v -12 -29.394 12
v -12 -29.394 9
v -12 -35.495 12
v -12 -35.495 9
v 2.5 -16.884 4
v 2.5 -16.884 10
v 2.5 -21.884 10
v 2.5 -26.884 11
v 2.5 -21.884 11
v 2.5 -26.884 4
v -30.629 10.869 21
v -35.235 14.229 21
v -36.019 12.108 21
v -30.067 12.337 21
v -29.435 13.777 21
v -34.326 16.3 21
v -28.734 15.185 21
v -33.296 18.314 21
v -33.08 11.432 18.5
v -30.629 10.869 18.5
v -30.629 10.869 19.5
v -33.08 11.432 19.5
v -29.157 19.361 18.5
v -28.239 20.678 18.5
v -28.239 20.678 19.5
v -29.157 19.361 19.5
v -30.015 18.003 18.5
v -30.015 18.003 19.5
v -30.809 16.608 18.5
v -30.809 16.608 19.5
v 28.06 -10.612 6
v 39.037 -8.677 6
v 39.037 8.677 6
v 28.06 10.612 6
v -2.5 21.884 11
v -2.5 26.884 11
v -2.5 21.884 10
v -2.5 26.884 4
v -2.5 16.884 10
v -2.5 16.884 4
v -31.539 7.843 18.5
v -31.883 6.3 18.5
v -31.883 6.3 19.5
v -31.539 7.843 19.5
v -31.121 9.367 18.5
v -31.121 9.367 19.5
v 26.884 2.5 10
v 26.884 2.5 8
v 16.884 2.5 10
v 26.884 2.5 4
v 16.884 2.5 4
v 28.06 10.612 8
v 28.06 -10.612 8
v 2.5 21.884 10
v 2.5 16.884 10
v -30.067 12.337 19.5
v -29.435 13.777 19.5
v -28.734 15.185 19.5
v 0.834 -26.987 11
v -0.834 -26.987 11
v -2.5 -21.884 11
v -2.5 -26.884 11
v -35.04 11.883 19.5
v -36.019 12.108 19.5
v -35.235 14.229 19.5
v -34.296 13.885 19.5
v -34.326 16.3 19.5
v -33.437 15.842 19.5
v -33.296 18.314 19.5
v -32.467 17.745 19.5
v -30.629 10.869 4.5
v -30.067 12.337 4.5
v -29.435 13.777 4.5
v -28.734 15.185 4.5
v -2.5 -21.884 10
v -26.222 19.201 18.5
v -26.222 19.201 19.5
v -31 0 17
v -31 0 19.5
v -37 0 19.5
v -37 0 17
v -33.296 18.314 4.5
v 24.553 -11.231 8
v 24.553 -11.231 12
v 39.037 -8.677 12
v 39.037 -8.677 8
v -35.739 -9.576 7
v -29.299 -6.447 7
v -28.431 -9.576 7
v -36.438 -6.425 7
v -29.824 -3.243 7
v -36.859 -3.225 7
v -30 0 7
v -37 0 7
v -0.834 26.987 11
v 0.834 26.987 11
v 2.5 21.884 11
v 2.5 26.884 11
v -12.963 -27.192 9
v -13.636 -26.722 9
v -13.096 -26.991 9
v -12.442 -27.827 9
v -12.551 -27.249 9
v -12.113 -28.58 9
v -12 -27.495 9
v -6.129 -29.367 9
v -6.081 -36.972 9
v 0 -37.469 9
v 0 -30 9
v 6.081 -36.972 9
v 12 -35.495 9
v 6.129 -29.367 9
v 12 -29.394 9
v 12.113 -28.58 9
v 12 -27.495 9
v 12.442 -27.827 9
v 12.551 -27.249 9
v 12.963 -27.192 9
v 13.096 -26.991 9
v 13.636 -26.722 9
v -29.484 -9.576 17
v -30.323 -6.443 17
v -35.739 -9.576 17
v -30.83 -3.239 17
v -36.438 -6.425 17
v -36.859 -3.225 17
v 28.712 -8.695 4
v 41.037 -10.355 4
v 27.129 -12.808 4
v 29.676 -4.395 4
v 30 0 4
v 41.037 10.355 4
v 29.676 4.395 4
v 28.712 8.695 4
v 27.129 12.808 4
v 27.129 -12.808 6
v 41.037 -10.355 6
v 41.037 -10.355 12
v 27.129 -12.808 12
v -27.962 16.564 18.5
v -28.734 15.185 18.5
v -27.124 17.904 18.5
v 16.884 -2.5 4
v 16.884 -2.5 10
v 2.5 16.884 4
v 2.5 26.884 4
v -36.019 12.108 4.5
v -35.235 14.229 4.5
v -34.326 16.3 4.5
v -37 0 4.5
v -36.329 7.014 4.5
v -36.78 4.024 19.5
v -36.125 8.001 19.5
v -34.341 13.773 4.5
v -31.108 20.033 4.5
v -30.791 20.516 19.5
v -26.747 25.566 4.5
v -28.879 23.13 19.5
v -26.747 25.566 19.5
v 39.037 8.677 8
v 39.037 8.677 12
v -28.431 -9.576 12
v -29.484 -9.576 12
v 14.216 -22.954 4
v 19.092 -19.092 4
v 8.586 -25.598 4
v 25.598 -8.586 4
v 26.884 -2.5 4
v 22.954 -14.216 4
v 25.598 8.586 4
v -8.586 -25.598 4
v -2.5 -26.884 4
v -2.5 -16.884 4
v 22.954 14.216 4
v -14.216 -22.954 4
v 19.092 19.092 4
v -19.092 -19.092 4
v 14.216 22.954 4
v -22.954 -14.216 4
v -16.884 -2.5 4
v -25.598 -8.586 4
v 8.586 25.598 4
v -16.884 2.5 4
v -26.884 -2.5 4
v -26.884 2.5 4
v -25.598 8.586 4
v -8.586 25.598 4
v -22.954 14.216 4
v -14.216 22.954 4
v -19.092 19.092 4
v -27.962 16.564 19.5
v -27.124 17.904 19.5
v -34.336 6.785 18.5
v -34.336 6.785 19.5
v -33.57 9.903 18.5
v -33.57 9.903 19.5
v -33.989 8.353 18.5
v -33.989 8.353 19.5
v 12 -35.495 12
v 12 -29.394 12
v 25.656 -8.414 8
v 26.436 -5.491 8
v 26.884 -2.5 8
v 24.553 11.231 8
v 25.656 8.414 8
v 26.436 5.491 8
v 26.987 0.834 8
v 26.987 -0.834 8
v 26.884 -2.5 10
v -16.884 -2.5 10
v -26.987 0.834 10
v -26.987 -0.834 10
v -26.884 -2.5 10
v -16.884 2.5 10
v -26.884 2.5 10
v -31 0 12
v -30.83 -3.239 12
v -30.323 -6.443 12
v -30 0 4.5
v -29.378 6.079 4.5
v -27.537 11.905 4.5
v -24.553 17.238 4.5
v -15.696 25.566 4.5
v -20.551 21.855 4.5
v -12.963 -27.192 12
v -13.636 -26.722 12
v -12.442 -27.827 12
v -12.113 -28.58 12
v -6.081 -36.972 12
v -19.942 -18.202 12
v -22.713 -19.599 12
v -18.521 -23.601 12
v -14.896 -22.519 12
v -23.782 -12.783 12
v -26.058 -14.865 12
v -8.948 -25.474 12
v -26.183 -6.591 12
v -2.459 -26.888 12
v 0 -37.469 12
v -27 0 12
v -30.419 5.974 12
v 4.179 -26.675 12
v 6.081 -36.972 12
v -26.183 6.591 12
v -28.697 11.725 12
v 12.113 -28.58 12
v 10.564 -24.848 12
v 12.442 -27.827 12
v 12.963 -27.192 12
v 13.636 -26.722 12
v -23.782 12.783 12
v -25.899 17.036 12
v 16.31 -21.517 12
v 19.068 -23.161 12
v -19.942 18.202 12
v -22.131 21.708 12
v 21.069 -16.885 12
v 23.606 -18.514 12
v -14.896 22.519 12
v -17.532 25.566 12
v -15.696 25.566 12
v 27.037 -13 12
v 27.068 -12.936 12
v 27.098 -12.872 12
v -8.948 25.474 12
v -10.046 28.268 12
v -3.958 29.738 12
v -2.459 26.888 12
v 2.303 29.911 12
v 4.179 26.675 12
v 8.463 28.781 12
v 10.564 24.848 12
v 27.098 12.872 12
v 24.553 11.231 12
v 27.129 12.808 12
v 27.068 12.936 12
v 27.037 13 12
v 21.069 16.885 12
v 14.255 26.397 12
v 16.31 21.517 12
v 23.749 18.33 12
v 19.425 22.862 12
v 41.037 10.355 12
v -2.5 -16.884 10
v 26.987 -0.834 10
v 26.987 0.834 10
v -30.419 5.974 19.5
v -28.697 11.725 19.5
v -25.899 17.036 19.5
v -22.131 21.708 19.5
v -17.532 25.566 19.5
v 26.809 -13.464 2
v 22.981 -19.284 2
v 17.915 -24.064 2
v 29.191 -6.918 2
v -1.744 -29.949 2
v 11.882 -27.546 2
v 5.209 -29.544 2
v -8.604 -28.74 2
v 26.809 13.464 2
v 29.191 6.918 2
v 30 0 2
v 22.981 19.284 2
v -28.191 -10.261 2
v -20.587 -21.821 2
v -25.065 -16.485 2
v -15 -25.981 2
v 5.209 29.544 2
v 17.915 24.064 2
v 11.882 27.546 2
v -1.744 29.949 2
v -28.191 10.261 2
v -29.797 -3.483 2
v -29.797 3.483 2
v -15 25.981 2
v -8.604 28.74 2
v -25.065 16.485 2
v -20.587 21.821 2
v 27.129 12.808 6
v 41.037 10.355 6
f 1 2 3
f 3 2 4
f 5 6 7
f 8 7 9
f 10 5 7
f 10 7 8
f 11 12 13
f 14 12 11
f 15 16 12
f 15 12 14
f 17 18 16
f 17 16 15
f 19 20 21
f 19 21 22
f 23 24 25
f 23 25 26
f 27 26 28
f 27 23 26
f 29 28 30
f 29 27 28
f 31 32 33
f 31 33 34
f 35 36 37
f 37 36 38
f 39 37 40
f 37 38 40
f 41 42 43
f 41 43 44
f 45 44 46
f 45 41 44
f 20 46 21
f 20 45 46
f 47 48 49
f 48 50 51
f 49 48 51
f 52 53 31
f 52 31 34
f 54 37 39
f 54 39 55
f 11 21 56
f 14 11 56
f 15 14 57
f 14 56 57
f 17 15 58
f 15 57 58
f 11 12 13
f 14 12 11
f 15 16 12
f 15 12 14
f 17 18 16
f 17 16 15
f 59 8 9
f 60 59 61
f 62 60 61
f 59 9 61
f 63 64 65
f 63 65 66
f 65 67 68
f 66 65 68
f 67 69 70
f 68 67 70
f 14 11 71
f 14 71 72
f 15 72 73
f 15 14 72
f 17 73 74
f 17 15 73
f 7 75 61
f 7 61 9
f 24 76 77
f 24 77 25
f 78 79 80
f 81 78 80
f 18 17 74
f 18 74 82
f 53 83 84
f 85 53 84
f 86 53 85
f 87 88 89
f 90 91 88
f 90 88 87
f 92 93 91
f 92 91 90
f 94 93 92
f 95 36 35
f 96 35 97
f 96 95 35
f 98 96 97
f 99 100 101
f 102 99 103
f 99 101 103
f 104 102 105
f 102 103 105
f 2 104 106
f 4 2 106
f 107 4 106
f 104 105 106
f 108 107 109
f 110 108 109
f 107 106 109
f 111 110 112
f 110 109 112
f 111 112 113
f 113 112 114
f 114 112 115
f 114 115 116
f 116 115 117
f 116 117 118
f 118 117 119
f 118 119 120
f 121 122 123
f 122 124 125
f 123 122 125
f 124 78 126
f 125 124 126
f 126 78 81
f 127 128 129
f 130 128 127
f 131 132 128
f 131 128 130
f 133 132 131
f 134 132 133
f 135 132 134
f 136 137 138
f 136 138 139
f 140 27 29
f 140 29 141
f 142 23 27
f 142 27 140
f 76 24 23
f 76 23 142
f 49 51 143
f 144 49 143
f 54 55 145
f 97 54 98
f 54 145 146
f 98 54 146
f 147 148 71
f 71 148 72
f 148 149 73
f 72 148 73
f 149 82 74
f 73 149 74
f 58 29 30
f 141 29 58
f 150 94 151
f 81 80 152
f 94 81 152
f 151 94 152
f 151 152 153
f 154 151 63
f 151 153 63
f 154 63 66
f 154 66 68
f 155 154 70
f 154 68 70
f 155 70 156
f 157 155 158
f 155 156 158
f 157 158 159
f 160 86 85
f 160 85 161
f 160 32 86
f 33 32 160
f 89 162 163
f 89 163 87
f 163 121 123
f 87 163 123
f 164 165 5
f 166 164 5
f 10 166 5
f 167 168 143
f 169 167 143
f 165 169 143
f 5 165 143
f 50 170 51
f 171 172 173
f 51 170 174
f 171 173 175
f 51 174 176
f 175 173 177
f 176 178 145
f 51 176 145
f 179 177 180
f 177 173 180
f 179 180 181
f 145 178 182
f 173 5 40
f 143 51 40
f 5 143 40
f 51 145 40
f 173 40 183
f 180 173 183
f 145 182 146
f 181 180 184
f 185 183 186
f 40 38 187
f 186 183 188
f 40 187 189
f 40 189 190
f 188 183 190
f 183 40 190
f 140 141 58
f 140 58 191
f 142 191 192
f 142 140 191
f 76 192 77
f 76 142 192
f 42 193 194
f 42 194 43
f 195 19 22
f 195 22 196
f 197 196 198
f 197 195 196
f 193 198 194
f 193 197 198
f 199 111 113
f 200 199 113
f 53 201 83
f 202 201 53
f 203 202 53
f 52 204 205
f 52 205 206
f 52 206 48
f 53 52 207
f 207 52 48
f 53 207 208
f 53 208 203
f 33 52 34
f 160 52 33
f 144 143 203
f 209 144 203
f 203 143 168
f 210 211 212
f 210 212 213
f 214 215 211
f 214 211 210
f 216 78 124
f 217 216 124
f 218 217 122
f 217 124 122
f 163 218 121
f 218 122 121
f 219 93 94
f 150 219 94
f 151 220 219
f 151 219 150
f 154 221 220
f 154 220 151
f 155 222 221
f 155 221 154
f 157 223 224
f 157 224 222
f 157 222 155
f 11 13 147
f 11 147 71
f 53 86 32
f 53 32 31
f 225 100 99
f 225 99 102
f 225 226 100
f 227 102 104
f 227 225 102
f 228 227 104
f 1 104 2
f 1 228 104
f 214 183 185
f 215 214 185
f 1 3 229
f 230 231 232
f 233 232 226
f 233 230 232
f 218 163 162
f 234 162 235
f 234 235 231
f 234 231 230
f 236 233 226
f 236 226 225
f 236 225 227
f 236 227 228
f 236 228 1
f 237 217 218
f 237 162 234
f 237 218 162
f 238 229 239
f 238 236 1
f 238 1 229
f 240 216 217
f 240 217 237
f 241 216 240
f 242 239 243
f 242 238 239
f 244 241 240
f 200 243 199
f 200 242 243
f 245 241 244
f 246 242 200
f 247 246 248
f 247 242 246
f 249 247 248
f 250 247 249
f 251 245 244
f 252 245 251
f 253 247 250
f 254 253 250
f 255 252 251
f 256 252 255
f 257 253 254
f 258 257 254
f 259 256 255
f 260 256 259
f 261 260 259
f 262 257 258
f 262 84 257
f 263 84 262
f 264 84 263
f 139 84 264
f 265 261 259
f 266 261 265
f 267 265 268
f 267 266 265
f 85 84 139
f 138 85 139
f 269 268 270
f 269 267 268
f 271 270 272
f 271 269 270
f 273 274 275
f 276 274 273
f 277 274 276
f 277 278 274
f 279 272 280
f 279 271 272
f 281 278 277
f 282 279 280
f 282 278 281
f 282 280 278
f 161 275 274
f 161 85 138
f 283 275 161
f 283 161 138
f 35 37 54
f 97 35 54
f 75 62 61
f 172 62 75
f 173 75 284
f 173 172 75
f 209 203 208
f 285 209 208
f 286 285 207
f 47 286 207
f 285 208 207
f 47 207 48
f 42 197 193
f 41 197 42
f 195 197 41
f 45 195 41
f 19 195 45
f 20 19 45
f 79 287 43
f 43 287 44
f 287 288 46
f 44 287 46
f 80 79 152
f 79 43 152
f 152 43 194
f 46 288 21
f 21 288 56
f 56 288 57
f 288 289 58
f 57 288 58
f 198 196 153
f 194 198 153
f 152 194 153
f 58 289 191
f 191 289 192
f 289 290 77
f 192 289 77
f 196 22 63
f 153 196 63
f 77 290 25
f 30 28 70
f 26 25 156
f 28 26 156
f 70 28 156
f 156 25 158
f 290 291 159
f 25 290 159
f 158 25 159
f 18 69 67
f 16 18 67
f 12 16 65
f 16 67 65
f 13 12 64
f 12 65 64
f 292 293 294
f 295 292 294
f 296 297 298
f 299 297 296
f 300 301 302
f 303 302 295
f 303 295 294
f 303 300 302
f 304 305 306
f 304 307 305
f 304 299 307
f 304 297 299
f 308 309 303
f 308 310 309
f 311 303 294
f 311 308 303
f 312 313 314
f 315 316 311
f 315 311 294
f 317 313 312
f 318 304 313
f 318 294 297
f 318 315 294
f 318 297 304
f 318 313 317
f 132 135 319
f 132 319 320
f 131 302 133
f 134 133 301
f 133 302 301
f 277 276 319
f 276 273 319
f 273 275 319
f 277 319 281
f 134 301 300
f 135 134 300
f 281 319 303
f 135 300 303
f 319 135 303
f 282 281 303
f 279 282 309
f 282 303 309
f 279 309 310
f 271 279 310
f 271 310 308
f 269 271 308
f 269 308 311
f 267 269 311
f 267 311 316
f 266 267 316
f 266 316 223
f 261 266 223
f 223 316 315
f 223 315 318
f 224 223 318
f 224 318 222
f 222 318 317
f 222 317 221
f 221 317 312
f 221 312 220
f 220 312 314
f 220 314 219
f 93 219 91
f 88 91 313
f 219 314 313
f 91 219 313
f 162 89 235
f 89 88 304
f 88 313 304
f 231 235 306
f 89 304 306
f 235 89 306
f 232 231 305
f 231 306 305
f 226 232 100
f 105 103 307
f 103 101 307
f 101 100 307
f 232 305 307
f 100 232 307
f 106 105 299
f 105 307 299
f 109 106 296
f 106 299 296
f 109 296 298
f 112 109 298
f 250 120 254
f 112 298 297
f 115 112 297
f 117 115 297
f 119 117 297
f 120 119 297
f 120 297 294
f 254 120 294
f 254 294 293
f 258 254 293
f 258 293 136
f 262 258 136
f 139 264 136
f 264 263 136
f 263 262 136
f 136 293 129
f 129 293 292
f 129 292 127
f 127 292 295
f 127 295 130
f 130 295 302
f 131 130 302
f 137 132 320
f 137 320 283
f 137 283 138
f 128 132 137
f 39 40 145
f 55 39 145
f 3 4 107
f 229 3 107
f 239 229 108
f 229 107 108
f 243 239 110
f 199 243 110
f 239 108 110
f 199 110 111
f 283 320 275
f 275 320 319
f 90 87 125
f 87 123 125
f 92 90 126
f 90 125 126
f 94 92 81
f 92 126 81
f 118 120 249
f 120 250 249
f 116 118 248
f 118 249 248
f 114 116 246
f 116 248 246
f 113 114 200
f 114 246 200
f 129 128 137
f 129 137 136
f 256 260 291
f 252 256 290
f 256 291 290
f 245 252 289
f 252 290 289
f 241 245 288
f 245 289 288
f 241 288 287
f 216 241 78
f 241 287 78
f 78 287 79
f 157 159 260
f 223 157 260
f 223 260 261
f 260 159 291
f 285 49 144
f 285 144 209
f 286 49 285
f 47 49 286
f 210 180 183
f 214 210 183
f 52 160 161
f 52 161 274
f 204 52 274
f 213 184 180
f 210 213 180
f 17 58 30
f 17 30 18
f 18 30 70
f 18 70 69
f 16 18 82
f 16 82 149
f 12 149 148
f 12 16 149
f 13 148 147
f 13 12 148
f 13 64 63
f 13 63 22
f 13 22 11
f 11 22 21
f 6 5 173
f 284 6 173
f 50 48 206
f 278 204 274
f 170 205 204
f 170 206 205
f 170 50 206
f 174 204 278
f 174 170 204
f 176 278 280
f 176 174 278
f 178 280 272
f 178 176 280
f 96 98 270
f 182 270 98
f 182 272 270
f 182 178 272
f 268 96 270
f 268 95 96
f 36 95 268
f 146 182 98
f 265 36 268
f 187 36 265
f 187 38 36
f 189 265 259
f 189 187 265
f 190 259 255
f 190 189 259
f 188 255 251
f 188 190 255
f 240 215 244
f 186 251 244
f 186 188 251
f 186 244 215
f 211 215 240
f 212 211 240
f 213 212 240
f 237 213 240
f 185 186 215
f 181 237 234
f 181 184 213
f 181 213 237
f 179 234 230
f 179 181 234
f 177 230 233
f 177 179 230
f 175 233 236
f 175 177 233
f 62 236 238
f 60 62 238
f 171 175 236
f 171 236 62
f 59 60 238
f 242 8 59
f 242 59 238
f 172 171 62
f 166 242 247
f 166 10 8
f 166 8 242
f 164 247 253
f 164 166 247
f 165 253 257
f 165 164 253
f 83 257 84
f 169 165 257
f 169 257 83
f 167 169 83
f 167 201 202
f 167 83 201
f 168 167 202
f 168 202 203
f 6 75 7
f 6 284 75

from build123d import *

# Parameters (mm, degrees)
SKETCH_1_R           = 30
EXTRUDE_1_DEPTH      = 2
SKETCH_5_R           = 30
SKETCH_5_R_2         = 27
EXTRUDE_2_DEPTH      = 10
EXTRUDE_START        = -3
EXTRUDE_3_DEPTH      = 3
FILLET_2_R           = 3
FILLET_3_R           = 3
EXTRUDE_START_2      = -6
EXTRUDE_4_DEPTH      = 6
EXTRUDE_6_DEPTH      = 7.5
SKETCH_14_R          = 31
CUT_EXTRUDE_3_DEPTH  = 7.5
CHAMFER_4_SIZE       = 2.644904711
CHAMFER_4_SIZE_2     = 15
CHAMFER_5_SIZE       = 2.644904711
CHAMFER_5_SIZE_2     = 15
CUT_EXTRUDE_START    = -4
CUT_EXTRUDE_6_DEPTH  = 4
EXTRUDE_10_DEPTH     = 5
CUT_EXTRUDE_START_2  = 6
CUT_EXTRUDE_7_DEPTH  = 6
EXTRUDE_11_DEPTH     = 8
EXTRUDE_12_DEPTH     = 1
EXTRUDE_13_DEPTH     = 1.5
EXTRUDE_14_DEPTH     = 16.5
CUT_EXTRUDE_START_3  = -1
CUT_EXTRUDE_8_DEPTH  = 1
EXTRUDE_START_3      = 2
EXTRUDE_15_DEPTH     = 2
CUT_EXTRUDE_9_DEPTH  = 2
SKETCH_33_R          = 30
CUT_EXTRUDE_10_DEPTH = 2
SKETCH_34_R          = 30
EXTRUDE_16_DEPTH     = 2


with BuildPart() as part:
    # 草图1 → 凸台-拉伸1 (new body)
    with BuildSketch(Plane.XY):
        Circle(SKETCH_1_R)
    extrude(amount=EXTRUDE_1_DEPTH)

    # 草图5 → 凸台-拉伸2 (add)
    with BuildSketch(Plane.XY.offset(2)):
        Circle(SKETCH_5_R)
        Circle(SKETCH_5_R_2, mode=Mode.SUBTRACT)
    extrude(amount=EXTRUDE_2_DEPTH)

    # 草图6 → 凸台-拉伸3 (add)
    with BuildSketch(Plane.XY.offset(12).offset(EXTRUDE_START)):
        with BuildLine():
            Line((-12, -27.49545417), (-12, -35.49545417))
            ThreePointArc((-12, -35.49545417), (0, -37.469017424), (12, -35.49545417))
            Line((12, -35.49545417), (12, -27.49545417))
            ThreePointArc((12, -27.49545417), (0, -30), (-12, -27.49545417))
        make_face()
    extrude(amount=EXTRUDE_3_DEPTH)

    # 圆角2
    fillet_2_edges = [part.edges().sort_by_distance(p)[0] for p in [
        (-12, -27.49545417, 10.5),
    ]]
    fillet(fillet_2_edges, radius=FILLET_2_R)

    # 圆角3
    fillet_3_edges = [part.edges().sort_by_distance(p)[0] for p in [
        (12, -27.49545417, 10.5),
    ]]
    fillet(fillet_3_edges, radius=FILLET_3_R)

    # 草图8 → 凸台-拉伸4 (add)
    with BuildSketch(Plane.XY.offset(12).offset(EXTRUDE_START_2)):
        with BuildLine():
            Line((27.037011669, -13), (41.037011669, -13))
            Line((41.037011669, -13), (41.037011669, 13))
            Line((41.037011669, 13), (27.037011669, 13))
            ThreePointArc((27.037011669, 13), (30, 0), (27.037011669, -13))
        make_face()
    extrude(amount=EXTRUDE_4_DEPTH)

    # 草图13 → 凸台-拉伸6 (add, symmetric)
    with BuildSketch(Plane.XY.offset(12)):
        with BuildLine():
            Line((-26.746575291, 25.566006927), (-15.696473801, 25.566006927))
            ThreePointArc((-15.696473801, 25.566006927), (-26.181044804, 14.647624141), (-30, 0))
            Line((-30, 0), (-37, 0))
            ThreePointArc((-37, 0), (-34.341107188, 13.772739637), (-26.746575291, 25.566006927))
        make_face()
    extrude(amount=EXTRUDE_6_DEPTH, both=True)

    # 草图14 → 切除-拉伸3 (cut)
    with BuildSketch(Plane.XY.offset(19.5)):
        Circle(SKETCH_14_R)
    extrude(amount=-CUT_EXTRUDE_3_DEPTH, mode=Mode.SUBTRACT)

    # 倒角4
    # the kernel refuses this chamfer: 15, 2.644904711 mm, written as the material it takes off along each edge
    with BuildSketch(Plane(origin=(41.037011669, 13, -32.978081946), x_dir=(0.21013876076743002, -0.9776715712462589, 0), z_dir=(0, 0, 1))) as chamfer_4_piece_1_section:
        Polygon((CHAMFER_4_SIZE * 0.977671571108, -CHAMFER_4_SIZE * 0.210138760738), (-CHAMFER_4_SIZE_2 * 0.210138760767, -CHAMFER_4_SIZE_2 * 0.977671571246), (0, 0), align=None)
    chamfer_4_piece_1 = extrude(amount=83.956163893, mode=Mode.PRIVATE)
    chamfer_4_piece_1 = chamfer_4_piece_1 - Plane(origin=(0, 0, 9), x_dir=(1, 0, 0), z_dir=(0, 0, -1)) * Cylinder(30, 227, mode=Mode.PRIVATE)
    add(chamfer_4_piece_1, mode=Mode.SUBTRACT)

    # 倒角5
    # the kernel refuses this chamfer: 15, 2.644904711 mm, written as the material it takes off along each edge
    with BuildSketch(Plane(origin=(41.037011669, -13, -32.978081946), x_dir=(0.21013876076743015, 0.9776715712462588, 0), z_dir=(0, 0, 1))) as chamfer_5_piece_1_section:
        Polygon((CHAMFER_5_SIZE * 0.977671571108, CHAMFER_5_SIZE * 0.210138760738), (-CHAMFER_5_SIZE_2 * 0.210138760767, CHAMFER_5_SIZE_2 * 0.977671571246), (0, 0), align=None)
    chamfer_5_piece_1 = extrude(amount=83.956163893, mode=Mode.PRIVATE)
    chamfer_5_piece_1 = chamfer_5_piece_1 - Plane(origin=(0, 0, 9), x_dir=(1, 0, 0), z_dir=(0, 0, -1)) * Cylinder(30, 227, mode=Mode.PRIVATE)
    add(chamfer_5_piece_1, mode=Mode.SUBTRACT)

    # 草图16 → 切除-拉伸6 (cut)
    with BuildSketch(Plane.XY.offset(12).offset(CUT_EXTRUDE_START)):
        with BuildLine():
            ThreePointArc((27, 0), (26.381265258, 5.747072595), (24.553419007, 11.230744191))
            Line((24.553419007, 11.230744191), (18.452318659, 12.306532794))
            Line((18.452318659, 12.306532794), (21.994315515, -11.681983183))
            Line((21.994315515, -11.681983183), (24.553419007, -11.230744191))
            ThreePointArc((24.553419007, -11.230744191), (26.381265258, -5.747072595), (27, 0))
        make_face()
        with BuildLine():
            Line((18.452318659, 12.306532794), (24.553419007, 11.230744191))
            ThreePointArc((24.553419007, 11.230744191), (-27, 0), (24.553419007, -11.230744191))
            Line((24.553419007, -11.230744191), (21.994315515, -11.681983183))
            Line((21.994315515, -11.681983183), (18.452318659, 12.306532794))
        make_face()
        with BuildLine():
            Line((39.037011669, 8.676896027), (27.995789134, 10.62376146))
            Line((27.995789134, 10.62376146), (24.553419007, 11.230744191))
            ThreePointArc((24.553419007, 11.230744191), (26.381265258, 5.747072595), (27, 0))
            ThreePointArc((27, 0), (26.381265258, -5.747072595), (24.553419007, -11.230744191))
            Line((24.553419007, -11.230744191), (39.037011669, -8.676896027))
            Line((39.037011669, -8.676896027), (39.037011669, 8.676896027))
        make_face()
    extrude(amount=CUT_EXTRUDE_6_DEPTH, mode=Mode.SUBTRACT)

    # 草图17 → 凸台-拉伸10 (add, symmetric)
    with BuildSketch(Plane.XY.offset(12)):
        with BuildLine():
            Line((-28.430518618, -9.576304669), (-35.739255573, -9.576304669))
            ThreePointArc((-35.739255573, -9.576304669), (-36.683459871, -4.829469112), (-37, 0))
            Line((-37, 0), (-31, 0))
            Line((-31, 0), (-30, 0))
            ThreePointArc((-30, 0), (-29.605029628, -4.852032639), (-28.430518618, -9.576304669))
        make_face()
    extrude(amount=EXTRUDE_10_DEPTH, both=True)

    # 草图18 → 切除-拉伸7 (cut)
    with BuildSketch(Plane.XY.offset(12).offset(CUT_EXTRUDE_START_2)):
        with BuildLine():
            ThreePointArc((-31, 0), (-30.618603506, -4.847795306), (-29.483798753, -9.576304669))
            Line((-29.483798753, -9.576304669), (-28.430518618, -9.576304669))
            ThreePointArc((-28.430518618, -9.576304669), (-29.605029628, -4.852032639), (-30, 0))
            Line((-30, 0), (-31, 0))
        make_face()
    extrude(amount=-CUT_EXTRUDE_7_DEPTH, mode=Mode.SUBTRACT)

    # 草图19 → 凸台-拉伸11 (add)
    with BuildSketch(Plane.XY.offset(2)):
        with BuildLine():
            Line((-2.5, 26.884010118), (-2.5, 16.884010118))
            Line((-2.5, 16.884010118), (2.5, 16.884010118))
            Line((2.5, 16.884010118), (2.5, 26.884010118))
            ThreePointArc((2.5, 26.884010118), (0, 27), (-2.5, 26.884010118))
        make_face()
        with BuildLine():
            Line((26.884010118, 2.5), (16.884010118, 2.5))
            Line((16.884010118, 2.5), (16.884010118, -2.5))
            Line((16.884010118, -2.5), (26.884010118, -2.5))
            ThreePointArc((26.884010118, -2.5), (27, 0), (26.884010118, 2.5))
        make_face()
        with BuildLine():
            Line((2.5, -26.884010118), (2.5, -16.884010118))
            Line((2.5, -16.884010118), (-2.5, -16.884010118))
            Line((-2.5, -16.884010118), (-2.5, -26.884010118))
            ThreePointArc((-2.5, -26.884010118), (0, -27), (2.5, -26.884010118))
        make_face()
        with BuildLine():
            Line((-26.884010118, -2.5), (-16.884010118, -2.5))
            Line((-16.884010118, -2.5), (-16.884010118, 2.5))
            Line((-16.884010118, 2.5), (-26.884010118, 2.5))
            ThreePointArc((-26.884010118, 2.5), (-27, 0), (-26.884010118, -2.5))
        make_face()
    extrude(amount=EXTRUDE_11_DEPTH)

    # 草图20 → 凸台-拉伸12 (add)
    with BuildSketch(Plane.XY.offset(10)):
        with BuildLine():
            ThreePointArc((2.5, -26.884010118), (0, -27), (-2.5, -26.884010118))
            Line((-2.5, -26.884010118), (-2.5, -21.884010118))
            Line((-2.5, -21.884010118), (2.5, -21.884010118))
            Line((2.5, -21.884010118), (2.5, -26.884010118))
        make_face()
        with BuildLine():
            ThreePointArc((2.5, 26.884010118), (0, 27), (-2.5, 26.884010118))
            Line((-2.5, 26.884010118), (-2.5, 21.884010118))
            Line((-2.5, 21.884010118), (2.5, 21.884010118))
            Line((2.5, 21.884010118), (2.5, 26.884010118))
        make_face()
    extrude(amount=EXTRUDE_12_DEPTH)

    # 草图21 → 凸台-拉伸13 (add)
    with BuildSketch(Plane.XY.offset(19.5)):
        with BuildLine():
            Line((-28.734434843, 15.184935109), (-33.295866493, 18.31352709))
            ThreePointArc((-33.295866493, 18.31352709), (-34.796265088, 15.271540063), (-36.019428995, 12.10787904))
            Line((-36.019428995, 12.10787904), (-30.628781703, 10.868658214))
            ThreePointArc((-30.628781703, 10.868658214), (-29.759963562, 13.061185581), (-28.734434843, 15.184935109))
        make_face()
    extrude(amount=EXTRUDE_13_DEPTH)

    # 草图28 → 切除-拉伸8 (cut)
    with BuildSketch(Plane.XY.offset(19.5).offset(CUT_EXTRUDE_START_3)):
        with BuildLine():
            Line((-34.336052546, 6.784946244), (-31.883477364, 6.300307226))
            ThreePointArc((-31.883477364, 6.300307226), (-31.339481347, 8.60737526), (-30.628781703, 10.868658214))
            Line((-30.628781703, 10.868658214), (-33.080272788, 11.432215546))
            ThreePointArc((-33.080272788, 11.432215546), (-33.788156333, 9.130196691), (-34.336052546, 6.784946244))
        make_face()
        with BuildLine():
            ThreePointArc((-28.734434843, 15.184935109), (-27.551258788, 17.238855508), (-26.22152974, 19.201077524))
            Line((-26.22152974, 19.201077524), (-28.23857049, 20.678083487))
            ThreePointArc((-28.23857049, 20.678083487), (-29.593761465, 18.687142166), (-30.80882562, 16.607717))
            Line((-30.80882562, 16.607717), (-28.734434843, 15.184935109))
        make_face()
    extrude(amount=CUT_EXTRUDE_8_DEPTH, mode=Mode.SUBTRACT)

    # 草图31 → 凸台-拉伸15 (add)
    with BuildSketch(Plane(origin=(0, 0, 6), x_dir=(-1, 0, 0), z_dir=(0, 0, -1)).offset(EXTRUDE_START_3)):
        with BuildLine():
            Line((-41.037011669, 10.355095289), (-41.037011669, -10.355095289))
            Line((-41.037011669, -10.355095289), (-27.128728731, -12.807500827))
            ThreePointArc((-27.128728731, -12.807500827), (-30, 0), (-27.128728731, 12.807500827))
            Line((-27.128728731, 12.807500827), (-41.037011669, 10.355095289))
        make_face()
    extrude(amount=-EXTRUDE_15_DEPTH)

    # 草图32 → 切除-拉伸9 (cut)
    with BuildSketch(Plane.XY.offset(8)):
        Polygon((39.037011669, -8.676896027), (28.060239243, -10.612397167), (28.060239243, 10.612397167), (39.037011669, 8.676896027), align=None)
    extrude(amount=-CUT_EXTRUDE_9_DEPTH, mode=Mode.SUBTRACT)

    # 草图33 → 切除-拉伸10 (cut)
    with BuildSketch(Plane(origin=(0, 0, 0), x_dir=(-1, 0, 0), z_dir=(0, 0, -1))):
        Circle(SKETCH_33_R)
    extrude(amount=-CUT_EXTRUDE_10_DEPTH, mode=Mode.SUBTRACT)

    # 草图34 → 凸台-拉伸16 (add)
    with BuildSketch(Plane(origin=(0, 0, 2), x_dir=(-1, 0, 0), z_dir=(0, 0, -1))):
        Circle(SKETCH_34_R)
    extrude(amount=-EXTRUDE_16_DEPTH)


with BuildPart() as body_2:
    # 草图26 → 凸台-拉伸14 (new body)
    with BuildSketch(Plane.XY.offset(21)):
        with BuildLine():
            Line((-28.734434843, 15.184935109), (-33.295866493, 18.31352709))
            ThreePointArc((-33.295866493, 18.31352709), (-34.796265088, 15.271540063), (-36.019428995, 12.10787904))
            Line((-36.019428995, 12.10787904), (-30.628781703, 10.868658214))
            ThreePointArc((-30.628781703, 10.868658214), (-29.759963562, 13.061185581), (-28.734434843, 15.184935109))
        make_face()
    extrude(amount=-EXTRUDE_14_DEPTH)


solid = Compound([part.part, body_2.part])
